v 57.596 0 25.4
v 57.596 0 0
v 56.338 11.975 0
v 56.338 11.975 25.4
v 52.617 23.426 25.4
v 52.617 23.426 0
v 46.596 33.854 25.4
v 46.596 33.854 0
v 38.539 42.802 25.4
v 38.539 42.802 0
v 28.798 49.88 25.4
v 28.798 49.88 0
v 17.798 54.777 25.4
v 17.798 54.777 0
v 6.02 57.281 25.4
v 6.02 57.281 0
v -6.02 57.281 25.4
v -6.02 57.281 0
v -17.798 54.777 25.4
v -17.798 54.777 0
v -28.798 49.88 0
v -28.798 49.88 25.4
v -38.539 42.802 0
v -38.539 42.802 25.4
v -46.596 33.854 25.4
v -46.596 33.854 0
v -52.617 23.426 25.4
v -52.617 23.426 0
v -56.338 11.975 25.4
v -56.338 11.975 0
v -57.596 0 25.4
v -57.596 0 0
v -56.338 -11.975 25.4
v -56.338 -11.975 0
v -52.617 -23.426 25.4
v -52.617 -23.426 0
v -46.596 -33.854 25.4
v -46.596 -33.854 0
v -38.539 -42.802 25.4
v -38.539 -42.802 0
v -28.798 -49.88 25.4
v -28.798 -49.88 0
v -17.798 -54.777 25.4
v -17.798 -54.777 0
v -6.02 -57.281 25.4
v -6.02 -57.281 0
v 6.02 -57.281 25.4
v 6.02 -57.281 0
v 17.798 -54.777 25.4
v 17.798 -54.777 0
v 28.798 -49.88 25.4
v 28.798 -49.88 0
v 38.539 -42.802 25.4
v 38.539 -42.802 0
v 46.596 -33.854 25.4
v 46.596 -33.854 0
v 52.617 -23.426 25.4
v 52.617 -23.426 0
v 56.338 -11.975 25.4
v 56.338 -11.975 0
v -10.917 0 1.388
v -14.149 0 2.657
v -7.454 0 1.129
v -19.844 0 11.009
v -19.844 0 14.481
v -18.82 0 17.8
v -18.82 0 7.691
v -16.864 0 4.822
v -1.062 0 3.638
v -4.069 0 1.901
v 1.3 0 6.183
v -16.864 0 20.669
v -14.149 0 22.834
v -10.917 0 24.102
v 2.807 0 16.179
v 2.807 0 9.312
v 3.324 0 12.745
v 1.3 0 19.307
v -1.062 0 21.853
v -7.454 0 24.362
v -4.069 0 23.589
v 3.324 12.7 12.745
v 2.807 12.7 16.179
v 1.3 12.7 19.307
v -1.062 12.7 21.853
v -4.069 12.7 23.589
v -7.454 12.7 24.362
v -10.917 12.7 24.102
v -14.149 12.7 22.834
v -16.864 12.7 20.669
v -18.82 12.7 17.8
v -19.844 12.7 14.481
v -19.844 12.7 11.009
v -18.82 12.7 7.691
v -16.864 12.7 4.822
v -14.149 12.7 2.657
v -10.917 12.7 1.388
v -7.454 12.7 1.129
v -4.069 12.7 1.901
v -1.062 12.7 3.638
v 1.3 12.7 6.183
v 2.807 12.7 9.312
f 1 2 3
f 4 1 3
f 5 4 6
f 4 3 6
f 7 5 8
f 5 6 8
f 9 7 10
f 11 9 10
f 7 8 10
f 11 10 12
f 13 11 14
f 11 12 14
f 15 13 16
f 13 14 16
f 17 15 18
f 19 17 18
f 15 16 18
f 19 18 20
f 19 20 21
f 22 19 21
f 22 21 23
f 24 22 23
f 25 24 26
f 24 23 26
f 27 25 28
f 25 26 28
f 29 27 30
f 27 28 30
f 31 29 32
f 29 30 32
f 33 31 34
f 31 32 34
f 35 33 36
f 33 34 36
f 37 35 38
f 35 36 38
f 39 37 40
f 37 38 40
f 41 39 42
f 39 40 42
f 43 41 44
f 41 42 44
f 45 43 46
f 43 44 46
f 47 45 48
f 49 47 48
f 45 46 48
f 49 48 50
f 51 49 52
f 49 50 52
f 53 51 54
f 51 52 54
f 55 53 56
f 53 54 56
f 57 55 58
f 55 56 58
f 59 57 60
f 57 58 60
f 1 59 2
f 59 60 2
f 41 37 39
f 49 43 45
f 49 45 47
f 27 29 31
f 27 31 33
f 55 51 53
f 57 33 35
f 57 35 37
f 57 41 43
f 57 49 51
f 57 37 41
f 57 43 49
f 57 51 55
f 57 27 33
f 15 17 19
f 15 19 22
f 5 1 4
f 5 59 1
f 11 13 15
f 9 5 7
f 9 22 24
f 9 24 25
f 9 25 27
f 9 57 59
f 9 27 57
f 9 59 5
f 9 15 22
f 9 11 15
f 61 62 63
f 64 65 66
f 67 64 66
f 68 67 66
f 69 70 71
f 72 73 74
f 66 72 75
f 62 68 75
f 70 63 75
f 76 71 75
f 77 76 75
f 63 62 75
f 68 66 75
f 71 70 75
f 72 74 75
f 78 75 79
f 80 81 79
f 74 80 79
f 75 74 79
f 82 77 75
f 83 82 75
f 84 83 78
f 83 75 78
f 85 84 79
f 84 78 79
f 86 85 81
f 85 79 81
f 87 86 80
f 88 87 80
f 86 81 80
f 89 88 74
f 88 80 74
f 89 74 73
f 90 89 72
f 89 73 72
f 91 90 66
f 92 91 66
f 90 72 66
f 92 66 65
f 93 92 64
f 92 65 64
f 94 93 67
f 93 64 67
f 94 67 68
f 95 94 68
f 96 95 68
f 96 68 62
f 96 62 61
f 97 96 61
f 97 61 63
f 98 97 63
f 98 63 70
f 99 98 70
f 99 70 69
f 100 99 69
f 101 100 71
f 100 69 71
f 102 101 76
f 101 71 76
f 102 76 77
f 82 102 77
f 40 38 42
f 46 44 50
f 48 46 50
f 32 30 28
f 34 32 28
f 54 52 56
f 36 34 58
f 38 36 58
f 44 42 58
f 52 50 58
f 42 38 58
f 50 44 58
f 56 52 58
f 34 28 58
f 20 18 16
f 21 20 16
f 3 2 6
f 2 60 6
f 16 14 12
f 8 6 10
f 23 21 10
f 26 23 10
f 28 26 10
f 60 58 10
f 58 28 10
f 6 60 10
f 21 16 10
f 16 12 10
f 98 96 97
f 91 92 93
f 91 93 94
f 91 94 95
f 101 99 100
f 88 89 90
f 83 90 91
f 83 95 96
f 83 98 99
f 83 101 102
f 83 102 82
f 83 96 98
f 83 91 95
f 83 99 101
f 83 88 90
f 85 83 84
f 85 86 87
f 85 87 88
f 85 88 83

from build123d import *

# Parameters (mm, degrees)
F0_R     = 57.5961395205
F1_DEPTH = 25.4
F2_R     = 41.9082998656
F3_DEPTH = 178
F4_R     = 11.649028694
F5_DEPTH = 12.7


# Not quite as in the source:
# - an extrude ends at something that could not be found from the text; its depth is read off the source's solid


with BuildPart() as f1:
    # F0 (on Top) → F1 (new body)
    with BuildSketch(Plane.XY):
        Circle(F0_R)
    extrude(amount=F1_DEPTH)

    # F2 (on Top) → F3 (cut, through all)
    with BuildSketch(Plane.XY):
        Circle(F2_R)
    extrude(amount=-F3_DEPTH, mode=Mode.SUBTRACT)

    # F4 (on Front) → F5 (cut)
    with BuildSketch(Plane.XZ):
        with Locations((-8.324730893, 12.7451797782)):
            Circle(F4_R)
    extrude(amount=-F5_DEPTH, mode=Mode.SUBTRACT)


solid = f1.part
